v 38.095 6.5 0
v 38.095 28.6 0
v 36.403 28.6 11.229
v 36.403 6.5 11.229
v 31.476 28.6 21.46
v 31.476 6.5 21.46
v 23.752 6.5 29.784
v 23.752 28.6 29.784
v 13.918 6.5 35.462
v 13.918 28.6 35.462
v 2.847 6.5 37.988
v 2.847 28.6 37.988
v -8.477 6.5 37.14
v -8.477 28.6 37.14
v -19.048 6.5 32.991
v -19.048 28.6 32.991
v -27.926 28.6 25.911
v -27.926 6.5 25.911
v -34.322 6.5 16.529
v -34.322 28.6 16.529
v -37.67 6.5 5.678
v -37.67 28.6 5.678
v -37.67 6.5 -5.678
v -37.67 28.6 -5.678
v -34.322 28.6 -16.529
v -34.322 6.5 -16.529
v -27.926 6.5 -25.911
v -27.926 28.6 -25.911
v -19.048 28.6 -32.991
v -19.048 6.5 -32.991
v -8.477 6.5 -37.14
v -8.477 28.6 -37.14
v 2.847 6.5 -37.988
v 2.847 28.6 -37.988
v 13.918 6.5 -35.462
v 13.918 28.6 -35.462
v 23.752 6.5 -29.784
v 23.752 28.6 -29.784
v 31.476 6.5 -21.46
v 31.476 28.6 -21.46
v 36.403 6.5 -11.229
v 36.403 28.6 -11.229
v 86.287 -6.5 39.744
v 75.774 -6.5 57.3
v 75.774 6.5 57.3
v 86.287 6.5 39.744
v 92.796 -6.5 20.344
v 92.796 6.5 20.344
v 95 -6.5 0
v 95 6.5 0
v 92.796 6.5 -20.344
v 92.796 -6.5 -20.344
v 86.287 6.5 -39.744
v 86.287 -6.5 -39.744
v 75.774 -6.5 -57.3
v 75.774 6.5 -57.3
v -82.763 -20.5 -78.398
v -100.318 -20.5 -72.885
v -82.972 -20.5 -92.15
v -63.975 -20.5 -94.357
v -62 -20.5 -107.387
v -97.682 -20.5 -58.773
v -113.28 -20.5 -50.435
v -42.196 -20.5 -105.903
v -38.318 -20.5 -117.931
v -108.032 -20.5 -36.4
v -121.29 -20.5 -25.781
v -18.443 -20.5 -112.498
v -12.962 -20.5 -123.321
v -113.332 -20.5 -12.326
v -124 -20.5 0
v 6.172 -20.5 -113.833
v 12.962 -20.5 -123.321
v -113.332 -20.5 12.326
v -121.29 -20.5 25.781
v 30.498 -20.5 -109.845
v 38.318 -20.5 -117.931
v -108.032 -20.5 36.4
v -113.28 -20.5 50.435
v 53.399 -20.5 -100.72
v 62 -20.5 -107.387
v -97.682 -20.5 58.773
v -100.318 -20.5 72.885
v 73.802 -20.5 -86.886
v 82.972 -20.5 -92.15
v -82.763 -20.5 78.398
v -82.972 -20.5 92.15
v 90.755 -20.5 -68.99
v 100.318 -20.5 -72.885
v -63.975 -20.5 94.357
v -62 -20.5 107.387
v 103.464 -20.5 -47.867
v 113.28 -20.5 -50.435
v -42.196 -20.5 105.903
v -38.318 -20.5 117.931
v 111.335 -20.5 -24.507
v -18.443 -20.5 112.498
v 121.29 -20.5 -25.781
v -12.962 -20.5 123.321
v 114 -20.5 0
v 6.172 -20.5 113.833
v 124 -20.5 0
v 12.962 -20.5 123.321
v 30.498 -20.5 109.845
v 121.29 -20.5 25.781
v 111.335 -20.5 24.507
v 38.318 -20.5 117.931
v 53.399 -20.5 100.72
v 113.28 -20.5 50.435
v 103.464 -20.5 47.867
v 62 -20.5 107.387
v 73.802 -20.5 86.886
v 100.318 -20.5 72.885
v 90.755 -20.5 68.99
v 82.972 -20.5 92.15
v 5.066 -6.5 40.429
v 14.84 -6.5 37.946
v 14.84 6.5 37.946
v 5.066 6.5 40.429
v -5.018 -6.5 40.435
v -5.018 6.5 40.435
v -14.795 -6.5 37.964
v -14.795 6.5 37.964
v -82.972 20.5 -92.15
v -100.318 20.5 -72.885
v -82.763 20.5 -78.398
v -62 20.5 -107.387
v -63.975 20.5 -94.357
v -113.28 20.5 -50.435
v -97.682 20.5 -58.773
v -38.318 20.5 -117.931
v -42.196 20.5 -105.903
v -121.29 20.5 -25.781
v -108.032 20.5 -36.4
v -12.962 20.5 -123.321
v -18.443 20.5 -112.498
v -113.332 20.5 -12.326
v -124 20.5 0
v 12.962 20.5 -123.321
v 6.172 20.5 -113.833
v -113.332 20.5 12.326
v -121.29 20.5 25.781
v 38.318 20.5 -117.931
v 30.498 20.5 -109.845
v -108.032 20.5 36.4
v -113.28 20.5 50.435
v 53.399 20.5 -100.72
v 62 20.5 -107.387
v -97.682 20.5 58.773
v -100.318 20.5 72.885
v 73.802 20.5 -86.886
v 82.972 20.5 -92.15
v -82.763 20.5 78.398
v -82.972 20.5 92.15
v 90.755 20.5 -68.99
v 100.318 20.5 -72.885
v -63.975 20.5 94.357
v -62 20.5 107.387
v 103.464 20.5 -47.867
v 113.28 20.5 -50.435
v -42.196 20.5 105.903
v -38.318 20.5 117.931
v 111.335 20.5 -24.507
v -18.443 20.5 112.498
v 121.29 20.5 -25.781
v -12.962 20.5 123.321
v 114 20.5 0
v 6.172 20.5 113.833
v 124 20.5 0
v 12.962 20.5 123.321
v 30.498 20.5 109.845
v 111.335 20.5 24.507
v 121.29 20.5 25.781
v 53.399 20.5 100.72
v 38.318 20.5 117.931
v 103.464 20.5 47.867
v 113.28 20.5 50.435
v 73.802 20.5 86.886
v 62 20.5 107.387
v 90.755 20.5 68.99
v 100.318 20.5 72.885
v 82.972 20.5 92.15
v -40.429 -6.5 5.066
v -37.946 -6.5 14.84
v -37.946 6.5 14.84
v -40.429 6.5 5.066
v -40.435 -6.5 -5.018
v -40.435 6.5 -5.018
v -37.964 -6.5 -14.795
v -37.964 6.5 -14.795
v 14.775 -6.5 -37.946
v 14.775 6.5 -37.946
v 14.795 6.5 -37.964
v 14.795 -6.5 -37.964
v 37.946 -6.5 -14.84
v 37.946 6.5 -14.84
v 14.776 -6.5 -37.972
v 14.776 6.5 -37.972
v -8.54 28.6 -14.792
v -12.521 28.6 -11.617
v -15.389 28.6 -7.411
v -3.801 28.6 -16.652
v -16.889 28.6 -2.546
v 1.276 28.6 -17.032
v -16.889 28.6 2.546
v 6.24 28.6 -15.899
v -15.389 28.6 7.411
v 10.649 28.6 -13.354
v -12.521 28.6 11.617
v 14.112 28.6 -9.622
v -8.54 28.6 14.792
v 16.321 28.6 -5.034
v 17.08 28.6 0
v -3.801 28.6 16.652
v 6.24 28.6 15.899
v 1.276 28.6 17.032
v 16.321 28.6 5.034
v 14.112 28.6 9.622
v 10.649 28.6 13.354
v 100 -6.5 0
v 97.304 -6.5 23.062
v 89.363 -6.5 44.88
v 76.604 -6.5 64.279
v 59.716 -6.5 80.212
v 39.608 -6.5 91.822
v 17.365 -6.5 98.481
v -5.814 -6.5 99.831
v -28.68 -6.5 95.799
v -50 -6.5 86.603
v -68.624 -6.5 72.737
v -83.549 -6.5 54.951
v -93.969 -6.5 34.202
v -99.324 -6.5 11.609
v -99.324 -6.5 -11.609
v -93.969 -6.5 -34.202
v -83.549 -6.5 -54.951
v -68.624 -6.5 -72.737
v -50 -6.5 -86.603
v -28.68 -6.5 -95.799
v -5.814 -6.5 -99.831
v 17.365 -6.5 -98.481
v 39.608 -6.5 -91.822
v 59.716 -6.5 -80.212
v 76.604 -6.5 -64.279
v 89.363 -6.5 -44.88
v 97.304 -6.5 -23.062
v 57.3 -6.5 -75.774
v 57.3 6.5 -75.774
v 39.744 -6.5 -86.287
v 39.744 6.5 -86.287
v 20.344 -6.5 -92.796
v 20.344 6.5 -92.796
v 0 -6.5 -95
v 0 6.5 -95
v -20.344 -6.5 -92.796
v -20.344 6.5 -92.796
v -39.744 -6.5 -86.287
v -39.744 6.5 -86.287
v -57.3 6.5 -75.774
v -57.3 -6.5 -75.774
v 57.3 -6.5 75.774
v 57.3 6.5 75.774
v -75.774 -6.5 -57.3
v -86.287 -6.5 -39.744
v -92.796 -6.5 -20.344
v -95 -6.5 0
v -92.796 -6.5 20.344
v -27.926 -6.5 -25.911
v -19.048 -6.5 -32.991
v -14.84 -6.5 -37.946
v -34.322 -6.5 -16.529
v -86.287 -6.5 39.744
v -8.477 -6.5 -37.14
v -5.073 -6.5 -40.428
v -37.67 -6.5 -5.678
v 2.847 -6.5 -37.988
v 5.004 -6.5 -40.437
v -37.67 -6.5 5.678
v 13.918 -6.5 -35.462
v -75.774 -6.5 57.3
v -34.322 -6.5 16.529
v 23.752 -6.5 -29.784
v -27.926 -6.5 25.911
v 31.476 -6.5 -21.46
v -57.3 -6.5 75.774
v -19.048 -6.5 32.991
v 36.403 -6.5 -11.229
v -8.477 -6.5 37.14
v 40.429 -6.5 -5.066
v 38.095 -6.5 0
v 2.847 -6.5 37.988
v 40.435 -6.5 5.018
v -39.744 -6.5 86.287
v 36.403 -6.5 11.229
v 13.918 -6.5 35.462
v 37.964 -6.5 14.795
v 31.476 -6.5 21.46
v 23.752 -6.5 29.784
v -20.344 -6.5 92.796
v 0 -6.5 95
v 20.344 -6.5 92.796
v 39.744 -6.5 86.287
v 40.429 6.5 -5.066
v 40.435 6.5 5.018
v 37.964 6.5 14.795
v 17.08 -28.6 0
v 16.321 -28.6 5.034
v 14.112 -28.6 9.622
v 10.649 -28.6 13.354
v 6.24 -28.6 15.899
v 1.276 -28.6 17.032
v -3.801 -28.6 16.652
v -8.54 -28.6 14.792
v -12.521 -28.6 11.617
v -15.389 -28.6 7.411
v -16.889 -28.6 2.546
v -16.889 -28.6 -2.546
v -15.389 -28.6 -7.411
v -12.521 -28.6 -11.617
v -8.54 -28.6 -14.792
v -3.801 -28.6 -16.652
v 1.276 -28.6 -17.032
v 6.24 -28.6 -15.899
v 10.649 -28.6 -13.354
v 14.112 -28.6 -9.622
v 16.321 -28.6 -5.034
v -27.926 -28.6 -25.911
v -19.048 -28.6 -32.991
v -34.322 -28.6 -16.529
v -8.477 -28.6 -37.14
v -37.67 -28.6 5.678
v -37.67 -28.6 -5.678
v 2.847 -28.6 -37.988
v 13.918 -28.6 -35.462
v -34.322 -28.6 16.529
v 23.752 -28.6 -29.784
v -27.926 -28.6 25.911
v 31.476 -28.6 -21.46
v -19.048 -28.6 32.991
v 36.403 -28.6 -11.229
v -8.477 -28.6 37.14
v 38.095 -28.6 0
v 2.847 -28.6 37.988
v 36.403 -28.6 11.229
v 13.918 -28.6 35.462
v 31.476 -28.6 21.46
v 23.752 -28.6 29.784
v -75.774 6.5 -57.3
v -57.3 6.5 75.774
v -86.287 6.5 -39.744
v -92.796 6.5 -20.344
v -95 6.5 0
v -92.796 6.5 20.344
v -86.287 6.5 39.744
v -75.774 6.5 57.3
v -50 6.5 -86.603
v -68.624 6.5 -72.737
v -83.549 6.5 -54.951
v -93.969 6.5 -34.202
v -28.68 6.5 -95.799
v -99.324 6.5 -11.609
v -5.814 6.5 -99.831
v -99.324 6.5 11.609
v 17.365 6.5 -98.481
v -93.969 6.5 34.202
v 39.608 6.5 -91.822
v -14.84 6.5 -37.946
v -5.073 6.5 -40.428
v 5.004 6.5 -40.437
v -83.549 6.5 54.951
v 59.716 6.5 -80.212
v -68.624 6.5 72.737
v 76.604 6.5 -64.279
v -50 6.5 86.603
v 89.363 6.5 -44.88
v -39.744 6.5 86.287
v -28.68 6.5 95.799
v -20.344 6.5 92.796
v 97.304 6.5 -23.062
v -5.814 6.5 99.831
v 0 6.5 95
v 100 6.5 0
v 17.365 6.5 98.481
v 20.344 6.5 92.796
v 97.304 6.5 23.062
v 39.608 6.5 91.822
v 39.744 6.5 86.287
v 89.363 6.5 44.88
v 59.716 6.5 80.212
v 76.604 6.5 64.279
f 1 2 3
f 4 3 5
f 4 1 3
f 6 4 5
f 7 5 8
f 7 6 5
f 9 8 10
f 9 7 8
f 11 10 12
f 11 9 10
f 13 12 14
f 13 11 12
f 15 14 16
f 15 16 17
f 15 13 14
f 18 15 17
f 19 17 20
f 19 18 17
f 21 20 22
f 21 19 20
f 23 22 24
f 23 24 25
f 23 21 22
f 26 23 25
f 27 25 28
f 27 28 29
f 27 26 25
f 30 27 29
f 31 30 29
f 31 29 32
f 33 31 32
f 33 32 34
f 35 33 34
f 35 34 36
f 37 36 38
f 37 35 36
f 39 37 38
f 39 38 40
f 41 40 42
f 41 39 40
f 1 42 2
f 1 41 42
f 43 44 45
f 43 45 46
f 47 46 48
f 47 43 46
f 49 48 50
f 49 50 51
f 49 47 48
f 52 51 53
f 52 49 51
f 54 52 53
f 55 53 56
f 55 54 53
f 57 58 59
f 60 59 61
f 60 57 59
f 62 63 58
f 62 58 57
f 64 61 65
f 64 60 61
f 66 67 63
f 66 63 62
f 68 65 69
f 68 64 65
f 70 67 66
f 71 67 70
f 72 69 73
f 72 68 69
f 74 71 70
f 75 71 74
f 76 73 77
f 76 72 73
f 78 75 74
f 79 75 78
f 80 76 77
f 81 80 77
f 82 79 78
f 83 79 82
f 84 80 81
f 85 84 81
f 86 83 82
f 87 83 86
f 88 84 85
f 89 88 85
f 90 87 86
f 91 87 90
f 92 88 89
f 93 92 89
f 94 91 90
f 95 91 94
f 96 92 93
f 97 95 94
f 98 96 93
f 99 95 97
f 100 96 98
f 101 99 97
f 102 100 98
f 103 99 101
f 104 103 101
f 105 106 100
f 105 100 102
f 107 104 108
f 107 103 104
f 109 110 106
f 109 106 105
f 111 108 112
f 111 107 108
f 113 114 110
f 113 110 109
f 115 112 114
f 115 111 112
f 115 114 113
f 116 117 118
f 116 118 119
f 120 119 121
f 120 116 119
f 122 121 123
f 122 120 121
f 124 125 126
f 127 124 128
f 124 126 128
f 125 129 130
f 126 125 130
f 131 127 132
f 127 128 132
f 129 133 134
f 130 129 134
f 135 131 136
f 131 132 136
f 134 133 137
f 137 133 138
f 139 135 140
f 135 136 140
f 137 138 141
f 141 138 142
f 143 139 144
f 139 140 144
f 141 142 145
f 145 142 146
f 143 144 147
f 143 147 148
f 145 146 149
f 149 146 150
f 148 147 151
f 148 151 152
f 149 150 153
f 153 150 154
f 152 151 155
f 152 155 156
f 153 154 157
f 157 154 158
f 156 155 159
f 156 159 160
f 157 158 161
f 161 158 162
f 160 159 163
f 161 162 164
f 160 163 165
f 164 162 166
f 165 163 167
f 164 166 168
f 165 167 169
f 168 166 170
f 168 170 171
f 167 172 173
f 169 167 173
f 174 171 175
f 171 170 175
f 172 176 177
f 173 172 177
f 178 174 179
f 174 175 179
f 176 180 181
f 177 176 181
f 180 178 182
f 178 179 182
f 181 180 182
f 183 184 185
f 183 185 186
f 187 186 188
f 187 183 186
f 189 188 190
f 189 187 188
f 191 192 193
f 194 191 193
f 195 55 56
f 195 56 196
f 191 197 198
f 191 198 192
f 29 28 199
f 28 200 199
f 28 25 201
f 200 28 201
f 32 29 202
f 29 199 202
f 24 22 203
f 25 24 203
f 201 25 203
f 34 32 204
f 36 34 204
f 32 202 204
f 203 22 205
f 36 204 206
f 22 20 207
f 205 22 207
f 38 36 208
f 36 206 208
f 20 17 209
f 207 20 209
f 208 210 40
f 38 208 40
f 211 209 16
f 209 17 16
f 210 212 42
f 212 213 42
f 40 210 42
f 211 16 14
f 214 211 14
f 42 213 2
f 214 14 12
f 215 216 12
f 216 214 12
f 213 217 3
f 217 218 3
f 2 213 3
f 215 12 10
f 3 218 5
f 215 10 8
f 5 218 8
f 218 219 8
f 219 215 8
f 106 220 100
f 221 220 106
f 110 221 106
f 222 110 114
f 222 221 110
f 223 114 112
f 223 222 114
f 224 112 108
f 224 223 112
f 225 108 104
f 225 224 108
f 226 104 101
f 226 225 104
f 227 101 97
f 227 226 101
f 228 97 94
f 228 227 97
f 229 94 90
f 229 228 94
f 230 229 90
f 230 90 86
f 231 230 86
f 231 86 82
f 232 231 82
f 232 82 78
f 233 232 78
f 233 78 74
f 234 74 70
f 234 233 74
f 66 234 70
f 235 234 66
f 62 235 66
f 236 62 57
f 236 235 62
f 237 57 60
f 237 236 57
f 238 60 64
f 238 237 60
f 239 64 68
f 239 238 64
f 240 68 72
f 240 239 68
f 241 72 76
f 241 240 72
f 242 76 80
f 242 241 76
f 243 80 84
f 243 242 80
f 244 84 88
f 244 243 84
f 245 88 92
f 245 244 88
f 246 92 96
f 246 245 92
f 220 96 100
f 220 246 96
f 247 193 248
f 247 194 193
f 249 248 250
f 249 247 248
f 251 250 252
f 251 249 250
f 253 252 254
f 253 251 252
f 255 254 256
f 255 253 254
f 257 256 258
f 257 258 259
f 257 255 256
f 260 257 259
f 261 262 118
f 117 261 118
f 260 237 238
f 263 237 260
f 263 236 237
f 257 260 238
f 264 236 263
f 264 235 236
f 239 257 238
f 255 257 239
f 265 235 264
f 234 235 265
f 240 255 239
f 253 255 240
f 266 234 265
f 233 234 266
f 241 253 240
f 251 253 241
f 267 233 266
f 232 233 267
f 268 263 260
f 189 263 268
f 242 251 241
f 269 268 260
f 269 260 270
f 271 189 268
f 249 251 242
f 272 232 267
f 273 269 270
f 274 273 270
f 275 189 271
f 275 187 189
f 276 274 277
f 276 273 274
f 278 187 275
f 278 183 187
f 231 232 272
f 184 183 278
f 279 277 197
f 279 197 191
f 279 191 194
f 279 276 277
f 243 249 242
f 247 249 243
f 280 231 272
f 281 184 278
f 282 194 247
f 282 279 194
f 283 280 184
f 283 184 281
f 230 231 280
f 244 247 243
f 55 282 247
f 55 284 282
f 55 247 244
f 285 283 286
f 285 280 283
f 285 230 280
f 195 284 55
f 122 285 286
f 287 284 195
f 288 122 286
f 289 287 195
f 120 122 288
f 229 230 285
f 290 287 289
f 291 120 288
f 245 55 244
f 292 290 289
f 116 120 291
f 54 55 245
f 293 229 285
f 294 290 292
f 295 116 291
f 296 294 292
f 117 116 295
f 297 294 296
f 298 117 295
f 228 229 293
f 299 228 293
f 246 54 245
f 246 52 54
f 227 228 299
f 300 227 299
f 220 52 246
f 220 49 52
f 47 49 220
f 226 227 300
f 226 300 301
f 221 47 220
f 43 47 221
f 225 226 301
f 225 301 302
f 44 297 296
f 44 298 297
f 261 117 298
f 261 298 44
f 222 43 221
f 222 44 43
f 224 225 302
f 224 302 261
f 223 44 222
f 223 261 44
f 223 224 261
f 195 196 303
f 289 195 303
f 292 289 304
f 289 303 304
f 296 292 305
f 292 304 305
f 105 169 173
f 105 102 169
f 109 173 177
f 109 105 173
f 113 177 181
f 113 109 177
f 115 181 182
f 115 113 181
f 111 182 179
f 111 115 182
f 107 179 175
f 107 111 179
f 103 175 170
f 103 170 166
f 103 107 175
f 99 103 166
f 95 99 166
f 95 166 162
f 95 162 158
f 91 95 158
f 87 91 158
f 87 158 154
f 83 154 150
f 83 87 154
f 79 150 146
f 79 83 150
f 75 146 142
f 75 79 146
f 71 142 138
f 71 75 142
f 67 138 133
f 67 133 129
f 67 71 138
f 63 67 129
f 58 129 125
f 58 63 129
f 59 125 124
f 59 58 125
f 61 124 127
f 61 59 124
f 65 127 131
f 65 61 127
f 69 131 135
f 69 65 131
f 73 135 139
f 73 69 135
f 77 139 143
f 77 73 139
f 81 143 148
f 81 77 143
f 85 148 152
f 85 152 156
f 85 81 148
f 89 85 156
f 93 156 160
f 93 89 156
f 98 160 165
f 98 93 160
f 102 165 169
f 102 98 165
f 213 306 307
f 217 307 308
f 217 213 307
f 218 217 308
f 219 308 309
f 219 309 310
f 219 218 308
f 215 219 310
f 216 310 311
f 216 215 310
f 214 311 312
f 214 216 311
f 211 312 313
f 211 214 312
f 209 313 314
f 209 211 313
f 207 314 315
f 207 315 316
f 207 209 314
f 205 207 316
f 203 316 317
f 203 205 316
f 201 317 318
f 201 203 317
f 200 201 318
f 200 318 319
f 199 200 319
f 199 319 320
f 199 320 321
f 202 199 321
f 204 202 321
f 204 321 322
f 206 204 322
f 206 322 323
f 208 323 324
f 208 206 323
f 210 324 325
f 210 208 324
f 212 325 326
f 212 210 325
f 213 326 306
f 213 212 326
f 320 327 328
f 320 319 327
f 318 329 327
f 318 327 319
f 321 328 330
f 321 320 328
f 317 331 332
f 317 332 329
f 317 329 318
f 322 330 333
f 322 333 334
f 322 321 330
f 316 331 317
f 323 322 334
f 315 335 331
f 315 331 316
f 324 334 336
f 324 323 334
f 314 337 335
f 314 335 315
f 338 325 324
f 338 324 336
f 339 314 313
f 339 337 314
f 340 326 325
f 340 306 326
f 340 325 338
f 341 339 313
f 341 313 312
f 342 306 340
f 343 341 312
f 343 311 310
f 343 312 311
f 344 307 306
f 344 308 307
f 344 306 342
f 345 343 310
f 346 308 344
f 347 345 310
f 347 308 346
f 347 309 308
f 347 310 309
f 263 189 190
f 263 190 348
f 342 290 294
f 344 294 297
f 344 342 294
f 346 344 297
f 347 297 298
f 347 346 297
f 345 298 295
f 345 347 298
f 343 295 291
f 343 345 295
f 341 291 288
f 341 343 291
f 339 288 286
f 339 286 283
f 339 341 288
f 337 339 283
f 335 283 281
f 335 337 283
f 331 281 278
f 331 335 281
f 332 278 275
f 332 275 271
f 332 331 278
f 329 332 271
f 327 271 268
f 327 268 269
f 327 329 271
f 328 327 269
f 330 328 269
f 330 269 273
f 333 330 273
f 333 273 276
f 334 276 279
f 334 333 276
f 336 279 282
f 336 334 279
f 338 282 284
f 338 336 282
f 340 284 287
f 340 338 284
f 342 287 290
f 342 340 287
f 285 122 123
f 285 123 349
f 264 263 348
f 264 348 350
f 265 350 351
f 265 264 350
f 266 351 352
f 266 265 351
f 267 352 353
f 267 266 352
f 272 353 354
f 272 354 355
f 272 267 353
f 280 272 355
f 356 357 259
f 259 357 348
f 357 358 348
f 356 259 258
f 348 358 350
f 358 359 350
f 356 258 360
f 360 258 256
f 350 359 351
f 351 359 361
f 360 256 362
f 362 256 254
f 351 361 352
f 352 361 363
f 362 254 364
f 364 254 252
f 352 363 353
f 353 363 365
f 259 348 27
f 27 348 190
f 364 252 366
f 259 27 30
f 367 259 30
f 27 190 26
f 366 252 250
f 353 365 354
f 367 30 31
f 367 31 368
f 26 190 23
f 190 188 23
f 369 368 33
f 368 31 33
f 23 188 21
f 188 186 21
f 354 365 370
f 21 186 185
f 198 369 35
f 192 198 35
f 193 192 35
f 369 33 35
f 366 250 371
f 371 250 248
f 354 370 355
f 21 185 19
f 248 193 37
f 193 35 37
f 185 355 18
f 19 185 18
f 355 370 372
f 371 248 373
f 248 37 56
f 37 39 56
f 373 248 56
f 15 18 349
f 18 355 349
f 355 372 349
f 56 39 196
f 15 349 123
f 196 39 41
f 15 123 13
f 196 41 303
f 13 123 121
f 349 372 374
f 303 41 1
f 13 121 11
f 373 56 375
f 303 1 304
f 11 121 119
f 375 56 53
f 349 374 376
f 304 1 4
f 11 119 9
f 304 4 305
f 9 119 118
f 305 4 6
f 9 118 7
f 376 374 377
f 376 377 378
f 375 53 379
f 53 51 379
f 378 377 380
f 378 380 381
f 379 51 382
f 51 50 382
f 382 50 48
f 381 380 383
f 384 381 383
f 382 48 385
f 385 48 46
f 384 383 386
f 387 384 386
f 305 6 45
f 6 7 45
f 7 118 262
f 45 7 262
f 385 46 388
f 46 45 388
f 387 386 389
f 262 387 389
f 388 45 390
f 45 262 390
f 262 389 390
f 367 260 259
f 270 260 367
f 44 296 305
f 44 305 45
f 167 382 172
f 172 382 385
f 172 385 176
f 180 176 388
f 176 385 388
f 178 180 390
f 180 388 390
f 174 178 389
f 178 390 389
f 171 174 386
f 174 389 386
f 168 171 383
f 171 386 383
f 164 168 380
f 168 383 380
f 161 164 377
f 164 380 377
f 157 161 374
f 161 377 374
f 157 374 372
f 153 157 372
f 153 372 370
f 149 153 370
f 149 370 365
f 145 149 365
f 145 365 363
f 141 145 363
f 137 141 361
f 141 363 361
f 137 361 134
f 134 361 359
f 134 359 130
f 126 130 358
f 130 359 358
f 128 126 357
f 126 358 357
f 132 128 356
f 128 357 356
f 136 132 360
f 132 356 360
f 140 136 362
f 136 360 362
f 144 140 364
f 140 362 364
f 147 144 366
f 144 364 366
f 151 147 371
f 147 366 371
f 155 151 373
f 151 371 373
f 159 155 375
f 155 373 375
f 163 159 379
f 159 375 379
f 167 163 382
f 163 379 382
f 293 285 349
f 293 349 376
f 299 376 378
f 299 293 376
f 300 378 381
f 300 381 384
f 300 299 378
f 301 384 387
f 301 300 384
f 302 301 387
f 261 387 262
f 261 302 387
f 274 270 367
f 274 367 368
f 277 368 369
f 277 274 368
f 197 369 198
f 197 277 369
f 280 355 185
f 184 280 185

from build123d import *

# Parameters (mm, degrees)
F0_R     = 38.095
F0_R_2   = 17.08
F1_DEPTH = 28.6
F0_R_3   = 100
F2_DEPTH = 6.5
F0_R_4   = 114
F3_DEPTH = 20.5
F4_SIZE  = 13.99999
F0_R_5   = 124
F5_DEPTH = 20.5


# Not quite as in the source:
# - a fillet or chamfer is up to 0.001 mm smaller than in the source, because OpenCascade refuses the exact size


with BuildPart() as f1:
    # F0 (on Front) → F1 (new body, symmetric)
    with BuildSketch(Plane.XZ):
        Circle(F0_R)
        Circle(F0_R_2, mode=Mode.SUBTRACT)
    extrude(amount=F1_DEPTH, both=True)

    # F0 (on Front) → F2 (join, symmetric)
    with BuildSketch(Plane.XZ):
        Circle(F0_R_3)
        with BuildLine():
            Line((-57.3000000001, -75.7740720829), (-14.84, -37.9464020034))
            ThreePointArc((-14.84, -37.9464020034), (-0.0346057341, -40.7449853042), (14.775520982, -37.9715552053))
            Line((14.775520982, -37.9715552053), (14.7748944579, -37.9464020034))
            Line((14.7748944579, -37.9464020034), (14.7947522966, -37.9640662928))
            Line((14.7947522966, -37.9640662928), (57.2999999977, -75.7740720847))
            ThreePointArc((57.2999999977, -75.7740720847), (-1.5e-09, -95.0000000002), (-57.3000000001, -75.7740720829))
        make_face(mode=Mode.SUBTRACT)
        with BuildLine():
            Line((75.7740720829, -57.3), (37.9464020034, -14.84))
            ThreePointArc((37.9464020034, -14.84), (40.7449927617, -0.0242867339), (37.9640662928, 14.7947522966))
            Line((37.9640662928, 14.7947522966), (75.7740720847, 57.2999999977))
            ThreePointArc((75.7740720847, 57.2999999977), (95.0000000002, -1.5e-09), (75.7740720829, -57.3))
        make_face(mode=Mode.SUBTRACT)
        with BuildLine():
            ThreePointArc((-75.7740720847, -57.2999999977), (-95.0000000002, 1.5e-09), (-75.7740720829, 57.3000000001))
            Line((-75.7740720829, 57.3), (-37.9464020034, 14.84))
            ThreePointArc((-37.9464020034, 14.84), (-40.7449927617, 0.0242867339), (-37.9640662928, -14.7947522966))
            Line((-37.9640662928, -14.7947522966), (-75.7740720847, -57.2999999977))
        make_face(mode=Mode.SUBTRACT)
        Circle(F0_R, mode=Mode.SUBTRACT)
        with BuildLine():
            Line((57.3, 75.7740720829), (14.84, 37.9464020034))
            ThreePointArc((14.84, 37.9464020034), (0.0242867339, 40.7449927617), (-14.7947522966, 37.9640662928))
            Line((-14.7947522966, 37.9640662928), (-57.2999999977, 75.7740720847))
            ThreePointArc((-57.2999999977, 75.7740720847), (1.5e-09, 95.0000000002), (57.3, 75.7740720829))
        make_face(mode=Mode.SUBTRACT)
    extrude(amount=F2_DEPTH, both=True)

    # F0 (on Front) → F3 (join, symmetric)
    with BuildSketch(Plane.XZ):
        Circle(F0_R_4)
        Circle(F0_R_3, mode=Mode.SUBTRACT)
    extrude(amount=F3_DEPTH, both=True)

    # F4 (size 14 in the source; OpenCascade refuses exactly that, so slightly less here)
    f4_edges = [f1.edges().sort_by_distance(p)[0] for p in [
        (-100, -20.5, 0),
        (-100, 20.5, 0),
    ]]
    chamfer(f4_edges, length=F4_SIZE)

    # F0 (on Front) → F5 (join, symmetric)
    with BuildSketch(Plane.XZ):
        Circle(F0_R_5)
        Circle(F0_R_4, mode=Mode.SUBTRACT)
    extrude(amount=F5_DEPTH, both=True)


solid = f1.part
